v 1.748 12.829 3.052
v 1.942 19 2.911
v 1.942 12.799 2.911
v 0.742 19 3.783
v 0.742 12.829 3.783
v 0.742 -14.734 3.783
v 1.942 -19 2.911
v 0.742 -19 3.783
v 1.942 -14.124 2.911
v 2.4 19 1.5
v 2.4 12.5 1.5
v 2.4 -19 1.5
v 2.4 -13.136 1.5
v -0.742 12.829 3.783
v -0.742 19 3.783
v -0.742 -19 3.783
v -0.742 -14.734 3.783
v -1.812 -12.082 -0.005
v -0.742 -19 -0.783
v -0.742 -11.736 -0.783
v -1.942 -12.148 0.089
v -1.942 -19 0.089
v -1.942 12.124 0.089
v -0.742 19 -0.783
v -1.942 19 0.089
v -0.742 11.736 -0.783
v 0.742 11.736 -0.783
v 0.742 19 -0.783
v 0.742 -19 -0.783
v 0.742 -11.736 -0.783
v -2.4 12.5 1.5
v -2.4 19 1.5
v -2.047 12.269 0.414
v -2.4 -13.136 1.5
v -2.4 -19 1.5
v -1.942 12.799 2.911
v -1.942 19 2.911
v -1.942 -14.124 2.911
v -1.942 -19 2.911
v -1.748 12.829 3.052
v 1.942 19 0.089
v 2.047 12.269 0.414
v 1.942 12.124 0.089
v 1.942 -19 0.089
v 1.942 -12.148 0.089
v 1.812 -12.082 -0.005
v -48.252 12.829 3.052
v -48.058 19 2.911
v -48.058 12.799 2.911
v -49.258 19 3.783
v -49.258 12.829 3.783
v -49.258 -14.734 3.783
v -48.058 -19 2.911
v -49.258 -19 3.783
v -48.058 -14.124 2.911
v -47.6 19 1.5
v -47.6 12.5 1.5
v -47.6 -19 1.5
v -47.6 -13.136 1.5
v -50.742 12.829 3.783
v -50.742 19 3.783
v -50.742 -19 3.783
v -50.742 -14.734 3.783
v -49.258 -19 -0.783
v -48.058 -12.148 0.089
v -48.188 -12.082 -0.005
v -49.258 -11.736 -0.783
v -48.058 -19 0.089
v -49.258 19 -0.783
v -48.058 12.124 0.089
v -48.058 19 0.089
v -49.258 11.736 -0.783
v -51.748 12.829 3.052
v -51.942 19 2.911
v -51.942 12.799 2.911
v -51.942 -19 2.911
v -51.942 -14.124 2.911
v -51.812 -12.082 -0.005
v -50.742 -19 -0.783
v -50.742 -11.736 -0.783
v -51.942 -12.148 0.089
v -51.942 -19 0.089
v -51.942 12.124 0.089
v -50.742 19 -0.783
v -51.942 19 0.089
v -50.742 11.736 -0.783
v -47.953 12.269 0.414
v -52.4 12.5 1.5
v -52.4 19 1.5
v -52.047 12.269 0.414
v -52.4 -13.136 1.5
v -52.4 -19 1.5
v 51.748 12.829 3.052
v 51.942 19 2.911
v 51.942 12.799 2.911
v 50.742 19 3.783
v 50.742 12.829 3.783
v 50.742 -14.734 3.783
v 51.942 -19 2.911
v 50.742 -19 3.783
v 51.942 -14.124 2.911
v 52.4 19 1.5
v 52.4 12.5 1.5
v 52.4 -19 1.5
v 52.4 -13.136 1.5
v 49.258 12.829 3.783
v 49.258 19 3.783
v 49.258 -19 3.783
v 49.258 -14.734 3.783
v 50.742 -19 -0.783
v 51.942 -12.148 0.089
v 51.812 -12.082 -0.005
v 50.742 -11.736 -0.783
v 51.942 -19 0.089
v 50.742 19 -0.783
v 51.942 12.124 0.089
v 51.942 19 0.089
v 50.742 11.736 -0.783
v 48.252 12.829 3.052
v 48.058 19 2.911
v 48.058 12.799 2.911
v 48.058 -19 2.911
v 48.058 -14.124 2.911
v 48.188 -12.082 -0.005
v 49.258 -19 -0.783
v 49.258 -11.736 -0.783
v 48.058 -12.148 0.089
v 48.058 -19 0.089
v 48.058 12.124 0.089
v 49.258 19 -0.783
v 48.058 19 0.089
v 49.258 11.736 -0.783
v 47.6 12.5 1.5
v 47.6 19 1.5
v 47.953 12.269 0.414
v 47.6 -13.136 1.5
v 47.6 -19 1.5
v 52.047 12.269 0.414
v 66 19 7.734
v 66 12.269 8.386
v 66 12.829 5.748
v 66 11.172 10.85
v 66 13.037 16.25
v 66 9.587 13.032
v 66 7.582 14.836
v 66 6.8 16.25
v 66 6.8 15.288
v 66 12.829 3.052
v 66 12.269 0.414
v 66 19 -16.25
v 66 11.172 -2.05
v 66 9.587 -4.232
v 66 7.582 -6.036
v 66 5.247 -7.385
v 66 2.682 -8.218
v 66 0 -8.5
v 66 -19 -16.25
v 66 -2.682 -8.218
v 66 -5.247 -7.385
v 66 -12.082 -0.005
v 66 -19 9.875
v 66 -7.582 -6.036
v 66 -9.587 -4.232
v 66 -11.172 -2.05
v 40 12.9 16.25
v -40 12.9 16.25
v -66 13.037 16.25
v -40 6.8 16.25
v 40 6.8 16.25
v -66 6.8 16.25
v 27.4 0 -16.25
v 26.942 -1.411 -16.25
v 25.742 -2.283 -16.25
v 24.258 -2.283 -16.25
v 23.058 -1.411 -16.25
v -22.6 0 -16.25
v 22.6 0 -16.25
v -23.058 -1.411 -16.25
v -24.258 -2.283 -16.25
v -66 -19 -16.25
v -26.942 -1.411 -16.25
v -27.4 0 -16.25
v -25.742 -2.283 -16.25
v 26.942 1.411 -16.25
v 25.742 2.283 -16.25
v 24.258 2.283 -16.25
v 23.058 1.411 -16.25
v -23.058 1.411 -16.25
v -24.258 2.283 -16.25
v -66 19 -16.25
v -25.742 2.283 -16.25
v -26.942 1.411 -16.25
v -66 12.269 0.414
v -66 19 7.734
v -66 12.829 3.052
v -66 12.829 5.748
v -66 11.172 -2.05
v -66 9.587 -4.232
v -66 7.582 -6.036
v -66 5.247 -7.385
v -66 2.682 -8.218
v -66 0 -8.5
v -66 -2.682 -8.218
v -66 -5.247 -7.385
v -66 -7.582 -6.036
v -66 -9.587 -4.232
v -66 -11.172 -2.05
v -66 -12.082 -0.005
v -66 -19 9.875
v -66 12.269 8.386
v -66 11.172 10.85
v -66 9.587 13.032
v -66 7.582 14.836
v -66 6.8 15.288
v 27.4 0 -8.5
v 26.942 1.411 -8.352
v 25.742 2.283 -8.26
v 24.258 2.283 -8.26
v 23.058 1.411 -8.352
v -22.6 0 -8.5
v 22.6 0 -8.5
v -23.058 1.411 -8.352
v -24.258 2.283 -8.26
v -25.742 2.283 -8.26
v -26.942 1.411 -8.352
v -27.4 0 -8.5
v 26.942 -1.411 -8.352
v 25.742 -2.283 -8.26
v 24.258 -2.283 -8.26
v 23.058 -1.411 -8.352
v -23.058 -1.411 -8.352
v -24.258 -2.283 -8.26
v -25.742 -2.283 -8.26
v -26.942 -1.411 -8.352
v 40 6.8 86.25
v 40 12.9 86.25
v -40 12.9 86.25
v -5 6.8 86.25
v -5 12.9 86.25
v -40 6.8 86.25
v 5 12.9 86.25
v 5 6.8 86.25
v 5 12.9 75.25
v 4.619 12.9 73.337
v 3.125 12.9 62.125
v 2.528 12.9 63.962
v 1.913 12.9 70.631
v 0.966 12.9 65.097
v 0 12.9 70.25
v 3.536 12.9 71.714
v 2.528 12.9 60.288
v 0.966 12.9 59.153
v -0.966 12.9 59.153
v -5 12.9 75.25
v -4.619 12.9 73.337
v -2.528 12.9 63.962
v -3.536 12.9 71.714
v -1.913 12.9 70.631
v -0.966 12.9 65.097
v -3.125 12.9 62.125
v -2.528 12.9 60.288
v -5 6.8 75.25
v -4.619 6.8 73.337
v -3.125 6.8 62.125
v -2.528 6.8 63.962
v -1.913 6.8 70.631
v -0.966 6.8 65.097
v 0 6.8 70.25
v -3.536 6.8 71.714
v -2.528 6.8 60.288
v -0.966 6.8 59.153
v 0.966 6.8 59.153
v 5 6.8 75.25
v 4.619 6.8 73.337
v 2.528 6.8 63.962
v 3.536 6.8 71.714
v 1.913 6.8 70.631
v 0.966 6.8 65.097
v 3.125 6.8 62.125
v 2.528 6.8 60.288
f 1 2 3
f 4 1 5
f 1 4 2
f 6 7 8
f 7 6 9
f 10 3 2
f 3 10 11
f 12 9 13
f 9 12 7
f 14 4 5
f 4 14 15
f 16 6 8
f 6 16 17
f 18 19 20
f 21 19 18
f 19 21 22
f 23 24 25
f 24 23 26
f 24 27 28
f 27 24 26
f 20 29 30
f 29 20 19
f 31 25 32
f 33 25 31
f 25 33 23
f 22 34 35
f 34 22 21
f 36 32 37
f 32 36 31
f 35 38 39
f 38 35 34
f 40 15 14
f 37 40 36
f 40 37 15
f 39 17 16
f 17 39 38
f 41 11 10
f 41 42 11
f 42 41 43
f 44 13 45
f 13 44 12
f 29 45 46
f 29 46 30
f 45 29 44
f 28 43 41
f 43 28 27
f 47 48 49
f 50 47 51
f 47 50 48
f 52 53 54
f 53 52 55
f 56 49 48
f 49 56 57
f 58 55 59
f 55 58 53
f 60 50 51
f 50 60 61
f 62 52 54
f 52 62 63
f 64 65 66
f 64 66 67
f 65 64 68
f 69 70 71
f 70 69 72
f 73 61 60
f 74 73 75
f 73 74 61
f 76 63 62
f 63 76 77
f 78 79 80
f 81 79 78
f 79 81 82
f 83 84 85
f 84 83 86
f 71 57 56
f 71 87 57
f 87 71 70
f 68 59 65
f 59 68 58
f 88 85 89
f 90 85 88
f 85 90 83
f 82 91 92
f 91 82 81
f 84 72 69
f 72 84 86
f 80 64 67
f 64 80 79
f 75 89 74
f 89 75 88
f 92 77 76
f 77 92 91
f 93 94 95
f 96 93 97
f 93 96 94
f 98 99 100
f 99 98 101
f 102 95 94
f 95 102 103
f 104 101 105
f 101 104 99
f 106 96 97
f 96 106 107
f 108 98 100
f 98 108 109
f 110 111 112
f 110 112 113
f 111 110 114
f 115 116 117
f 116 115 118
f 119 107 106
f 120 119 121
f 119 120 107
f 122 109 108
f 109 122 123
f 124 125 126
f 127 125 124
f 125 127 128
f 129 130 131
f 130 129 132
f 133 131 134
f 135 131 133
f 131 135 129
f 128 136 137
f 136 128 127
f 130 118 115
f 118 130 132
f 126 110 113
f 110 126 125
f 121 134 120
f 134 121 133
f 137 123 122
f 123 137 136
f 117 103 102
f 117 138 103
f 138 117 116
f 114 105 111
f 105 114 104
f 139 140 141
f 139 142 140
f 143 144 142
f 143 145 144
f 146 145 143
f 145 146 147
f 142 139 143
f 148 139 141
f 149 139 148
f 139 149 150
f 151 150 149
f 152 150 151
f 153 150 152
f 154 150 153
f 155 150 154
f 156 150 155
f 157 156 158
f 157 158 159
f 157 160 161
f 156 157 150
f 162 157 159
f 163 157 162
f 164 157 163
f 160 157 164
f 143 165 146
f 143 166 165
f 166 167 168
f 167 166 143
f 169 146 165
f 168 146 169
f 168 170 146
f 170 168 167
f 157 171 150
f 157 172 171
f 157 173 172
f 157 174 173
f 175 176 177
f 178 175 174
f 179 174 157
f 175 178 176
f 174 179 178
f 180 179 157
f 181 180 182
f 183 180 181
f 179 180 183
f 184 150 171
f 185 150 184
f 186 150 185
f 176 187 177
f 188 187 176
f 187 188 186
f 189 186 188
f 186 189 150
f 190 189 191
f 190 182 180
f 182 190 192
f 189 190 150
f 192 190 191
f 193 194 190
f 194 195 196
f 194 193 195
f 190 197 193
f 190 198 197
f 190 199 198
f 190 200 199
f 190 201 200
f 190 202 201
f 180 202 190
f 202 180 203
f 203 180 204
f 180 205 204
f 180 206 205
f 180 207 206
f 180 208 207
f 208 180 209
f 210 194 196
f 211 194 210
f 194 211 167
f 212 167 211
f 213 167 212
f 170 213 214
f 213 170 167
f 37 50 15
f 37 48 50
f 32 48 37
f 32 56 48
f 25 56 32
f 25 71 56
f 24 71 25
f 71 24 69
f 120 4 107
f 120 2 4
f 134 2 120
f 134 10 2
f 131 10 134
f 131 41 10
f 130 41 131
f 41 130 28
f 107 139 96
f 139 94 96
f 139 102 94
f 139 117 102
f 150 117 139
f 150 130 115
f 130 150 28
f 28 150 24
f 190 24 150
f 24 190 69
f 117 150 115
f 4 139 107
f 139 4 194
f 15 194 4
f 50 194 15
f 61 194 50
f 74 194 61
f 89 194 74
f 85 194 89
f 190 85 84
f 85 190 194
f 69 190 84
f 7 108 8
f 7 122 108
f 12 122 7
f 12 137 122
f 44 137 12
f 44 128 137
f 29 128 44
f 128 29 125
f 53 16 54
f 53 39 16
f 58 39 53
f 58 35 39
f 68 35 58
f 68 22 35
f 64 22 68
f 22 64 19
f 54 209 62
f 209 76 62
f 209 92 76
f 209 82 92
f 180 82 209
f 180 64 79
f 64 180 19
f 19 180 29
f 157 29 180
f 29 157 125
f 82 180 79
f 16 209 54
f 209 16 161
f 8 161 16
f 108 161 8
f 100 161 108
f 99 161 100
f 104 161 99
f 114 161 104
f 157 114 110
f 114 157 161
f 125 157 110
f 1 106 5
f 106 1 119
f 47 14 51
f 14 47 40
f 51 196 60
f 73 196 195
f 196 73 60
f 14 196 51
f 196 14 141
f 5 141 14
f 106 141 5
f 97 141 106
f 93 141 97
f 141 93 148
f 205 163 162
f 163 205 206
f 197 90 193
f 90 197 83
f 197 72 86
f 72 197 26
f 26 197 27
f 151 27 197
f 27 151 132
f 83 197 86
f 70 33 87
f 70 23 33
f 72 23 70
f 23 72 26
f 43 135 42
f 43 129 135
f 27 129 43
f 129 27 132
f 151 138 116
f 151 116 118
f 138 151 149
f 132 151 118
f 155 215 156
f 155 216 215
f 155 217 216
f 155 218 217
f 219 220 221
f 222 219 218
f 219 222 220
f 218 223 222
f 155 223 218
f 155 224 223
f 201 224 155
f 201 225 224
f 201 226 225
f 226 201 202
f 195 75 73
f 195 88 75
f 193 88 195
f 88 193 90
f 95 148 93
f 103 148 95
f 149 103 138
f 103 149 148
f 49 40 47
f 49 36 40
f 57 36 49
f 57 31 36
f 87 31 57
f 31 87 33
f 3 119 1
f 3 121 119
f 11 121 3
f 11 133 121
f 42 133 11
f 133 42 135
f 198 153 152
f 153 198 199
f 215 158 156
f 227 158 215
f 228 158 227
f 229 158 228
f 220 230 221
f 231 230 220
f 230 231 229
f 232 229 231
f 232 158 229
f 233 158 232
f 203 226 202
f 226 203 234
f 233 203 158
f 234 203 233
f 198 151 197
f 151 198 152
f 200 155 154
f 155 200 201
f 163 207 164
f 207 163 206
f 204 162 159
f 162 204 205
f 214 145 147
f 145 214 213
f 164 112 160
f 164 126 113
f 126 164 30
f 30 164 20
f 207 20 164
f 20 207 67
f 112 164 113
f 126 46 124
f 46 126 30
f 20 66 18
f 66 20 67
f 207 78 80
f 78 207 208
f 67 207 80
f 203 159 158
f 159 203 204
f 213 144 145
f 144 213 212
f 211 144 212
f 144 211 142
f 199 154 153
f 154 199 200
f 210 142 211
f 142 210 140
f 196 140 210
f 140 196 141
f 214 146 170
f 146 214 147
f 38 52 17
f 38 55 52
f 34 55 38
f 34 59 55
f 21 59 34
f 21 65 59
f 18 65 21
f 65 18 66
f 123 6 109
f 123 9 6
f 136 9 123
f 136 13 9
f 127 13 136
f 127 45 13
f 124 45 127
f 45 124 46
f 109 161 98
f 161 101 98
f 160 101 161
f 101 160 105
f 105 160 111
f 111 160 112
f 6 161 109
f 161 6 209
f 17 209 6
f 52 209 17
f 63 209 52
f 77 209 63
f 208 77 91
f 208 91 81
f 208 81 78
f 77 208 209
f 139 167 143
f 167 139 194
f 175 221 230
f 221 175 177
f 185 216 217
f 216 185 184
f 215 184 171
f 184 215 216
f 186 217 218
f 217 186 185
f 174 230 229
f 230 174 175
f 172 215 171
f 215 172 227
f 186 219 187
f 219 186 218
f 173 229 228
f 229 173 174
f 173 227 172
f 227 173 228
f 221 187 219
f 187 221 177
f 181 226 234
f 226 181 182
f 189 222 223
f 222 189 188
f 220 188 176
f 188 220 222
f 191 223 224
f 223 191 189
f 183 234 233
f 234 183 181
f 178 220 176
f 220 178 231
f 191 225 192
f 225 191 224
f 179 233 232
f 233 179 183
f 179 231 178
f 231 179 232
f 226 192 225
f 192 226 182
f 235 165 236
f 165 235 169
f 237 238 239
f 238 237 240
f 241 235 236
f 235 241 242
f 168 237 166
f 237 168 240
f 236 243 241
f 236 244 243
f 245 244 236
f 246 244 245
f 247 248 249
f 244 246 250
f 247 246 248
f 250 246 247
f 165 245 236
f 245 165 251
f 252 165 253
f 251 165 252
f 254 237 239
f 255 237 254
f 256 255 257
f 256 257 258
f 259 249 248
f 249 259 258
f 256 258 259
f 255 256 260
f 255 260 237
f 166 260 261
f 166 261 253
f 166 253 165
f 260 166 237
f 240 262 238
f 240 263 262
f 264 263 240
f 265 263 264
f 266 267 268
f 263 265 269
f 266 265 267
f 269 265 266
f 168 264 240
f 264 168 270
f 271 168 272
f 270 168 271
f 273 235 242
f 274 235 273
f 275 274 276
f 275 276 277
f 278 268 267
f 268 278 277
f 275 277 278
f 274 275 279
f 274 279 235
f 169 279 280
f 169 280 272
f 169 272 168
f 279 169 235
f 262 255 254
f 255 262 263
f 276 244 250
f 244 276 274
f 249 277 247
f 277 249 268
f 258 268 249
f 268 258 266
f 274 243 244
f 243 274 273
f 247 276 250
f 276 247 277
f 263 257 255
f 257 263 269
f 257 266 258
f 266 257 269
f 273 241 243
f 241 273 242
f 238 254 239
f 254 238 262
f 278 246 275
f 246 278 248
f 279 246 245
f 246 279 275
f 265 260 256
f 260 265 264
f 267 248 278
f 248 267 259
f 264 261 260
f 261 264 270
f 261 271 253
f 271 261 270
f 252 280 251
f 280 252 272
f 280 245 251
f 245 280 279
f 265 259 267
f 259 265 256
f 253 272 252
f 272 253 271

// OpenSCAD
nakladka_sz = 38; //31.4
nakladka_dl = 132;
nakladka_h = 32.5;
dno_grubosc = 7.75;

rama_sr = 25.8;

sruba_sr = 4.8;
sruba_od_dna = 15.35;
sruba_od_boku = 12.7;
sruby_odstep = 50;

mocowanie_h = 50+20; //35
mocowanie_sr1 = 10; // lub 12
mocowanie_gr = (nakladka_sz-rama_sr)/2;
mocowanie_dl = 80;

module sruba_dziura(sr){
    rotate([90,0,0]){
        cylinder(h=nakladka_sz+30, d=sr, center=true, $fn=10);
        
    }
}

module mocowanie(h, sr1, gr, dl, sr2){
    difference(){
    cube([dl, gr, h],center = true);
    
    translate([0,0,h/2-16+sr1/2]){
    rotate([90,0,0]){
      cylinder(gr+10, d=sr1, center=true);   
    }
    }
    translate([0,0,h-16+sr1/2]){
        cube([sr1, gr+10, h],center = true);
    }
    translate([0,0,h/2-16-sr2/2-5]){
    rotate([90,0,0]){
    cylinder(gr+10, d=sr2, center=true);
    }
    }
    
    }
}

union(){
    difference(){
        cube([nakladka_dl, nakladka_sz, nakladka_h], center=true);
        
        translate([0,0,-nakladka_h/2+dno_grubosc+rama_sr/2]){
        rotate([0,90,0]){
            #cylinder(h=nakladka_dl+30, d=rama_sr, center=true);
            
        }
        }
        
        rotate([0,0,0]){
        translate([0,-mocowanie_gr/2,dno_grubosc+rama_sr/2]){
            #cube([nakladka_dl+30, rama_sr-mocowanie_gr, nakladka_h],center = true);
        }}
        
        rotate([35,0,0]){
        translate([0,-mocowanie_gr/2+3,dno_grubosc+rama_sr/2]){
            #cube([nakladka_dl+30, rama_sr-mocowanie_gr, nakladka_h],center = true);
        }}
        
                rotate([35,0,0]){
        translate([0,25,-2.5]){
            #cube([nakladka_dl+30, 10, 17],center = true);
        }}
        
        translate([0,0,-nakladka_h/2+sruba_sr/2+sruba_od_dna]){
            sruba_dziura(sruba_sr);
            
            translate([-sruby_odstep,0,0]){
               sruba_dziura(sruba_sr); 
            }
            
             translate([sruby_odstep,0,0]){
               sruba_dziura(sruba_sr); 
            }
            
        }
        translate([25,0,0]){
            rotate([-90,0,0]){
                sruba_dziura(sruba_sr); 
            }
        }
         translate([-25,0,0]){
            rotate([-90,0,0]){
                sruba_dziura(sruba_sr); 
            }
        }
    }

    translate([0,nakladka_sz/2-mocowanie_gr/2-mocowanie_gr,nakladka_h/2+mocowanie_h/2]){
        mocowanie(mocowanie_h, mocowanie_sr1, mocowanie_gr, mocowanie_dl, 6.25);
    }

}
